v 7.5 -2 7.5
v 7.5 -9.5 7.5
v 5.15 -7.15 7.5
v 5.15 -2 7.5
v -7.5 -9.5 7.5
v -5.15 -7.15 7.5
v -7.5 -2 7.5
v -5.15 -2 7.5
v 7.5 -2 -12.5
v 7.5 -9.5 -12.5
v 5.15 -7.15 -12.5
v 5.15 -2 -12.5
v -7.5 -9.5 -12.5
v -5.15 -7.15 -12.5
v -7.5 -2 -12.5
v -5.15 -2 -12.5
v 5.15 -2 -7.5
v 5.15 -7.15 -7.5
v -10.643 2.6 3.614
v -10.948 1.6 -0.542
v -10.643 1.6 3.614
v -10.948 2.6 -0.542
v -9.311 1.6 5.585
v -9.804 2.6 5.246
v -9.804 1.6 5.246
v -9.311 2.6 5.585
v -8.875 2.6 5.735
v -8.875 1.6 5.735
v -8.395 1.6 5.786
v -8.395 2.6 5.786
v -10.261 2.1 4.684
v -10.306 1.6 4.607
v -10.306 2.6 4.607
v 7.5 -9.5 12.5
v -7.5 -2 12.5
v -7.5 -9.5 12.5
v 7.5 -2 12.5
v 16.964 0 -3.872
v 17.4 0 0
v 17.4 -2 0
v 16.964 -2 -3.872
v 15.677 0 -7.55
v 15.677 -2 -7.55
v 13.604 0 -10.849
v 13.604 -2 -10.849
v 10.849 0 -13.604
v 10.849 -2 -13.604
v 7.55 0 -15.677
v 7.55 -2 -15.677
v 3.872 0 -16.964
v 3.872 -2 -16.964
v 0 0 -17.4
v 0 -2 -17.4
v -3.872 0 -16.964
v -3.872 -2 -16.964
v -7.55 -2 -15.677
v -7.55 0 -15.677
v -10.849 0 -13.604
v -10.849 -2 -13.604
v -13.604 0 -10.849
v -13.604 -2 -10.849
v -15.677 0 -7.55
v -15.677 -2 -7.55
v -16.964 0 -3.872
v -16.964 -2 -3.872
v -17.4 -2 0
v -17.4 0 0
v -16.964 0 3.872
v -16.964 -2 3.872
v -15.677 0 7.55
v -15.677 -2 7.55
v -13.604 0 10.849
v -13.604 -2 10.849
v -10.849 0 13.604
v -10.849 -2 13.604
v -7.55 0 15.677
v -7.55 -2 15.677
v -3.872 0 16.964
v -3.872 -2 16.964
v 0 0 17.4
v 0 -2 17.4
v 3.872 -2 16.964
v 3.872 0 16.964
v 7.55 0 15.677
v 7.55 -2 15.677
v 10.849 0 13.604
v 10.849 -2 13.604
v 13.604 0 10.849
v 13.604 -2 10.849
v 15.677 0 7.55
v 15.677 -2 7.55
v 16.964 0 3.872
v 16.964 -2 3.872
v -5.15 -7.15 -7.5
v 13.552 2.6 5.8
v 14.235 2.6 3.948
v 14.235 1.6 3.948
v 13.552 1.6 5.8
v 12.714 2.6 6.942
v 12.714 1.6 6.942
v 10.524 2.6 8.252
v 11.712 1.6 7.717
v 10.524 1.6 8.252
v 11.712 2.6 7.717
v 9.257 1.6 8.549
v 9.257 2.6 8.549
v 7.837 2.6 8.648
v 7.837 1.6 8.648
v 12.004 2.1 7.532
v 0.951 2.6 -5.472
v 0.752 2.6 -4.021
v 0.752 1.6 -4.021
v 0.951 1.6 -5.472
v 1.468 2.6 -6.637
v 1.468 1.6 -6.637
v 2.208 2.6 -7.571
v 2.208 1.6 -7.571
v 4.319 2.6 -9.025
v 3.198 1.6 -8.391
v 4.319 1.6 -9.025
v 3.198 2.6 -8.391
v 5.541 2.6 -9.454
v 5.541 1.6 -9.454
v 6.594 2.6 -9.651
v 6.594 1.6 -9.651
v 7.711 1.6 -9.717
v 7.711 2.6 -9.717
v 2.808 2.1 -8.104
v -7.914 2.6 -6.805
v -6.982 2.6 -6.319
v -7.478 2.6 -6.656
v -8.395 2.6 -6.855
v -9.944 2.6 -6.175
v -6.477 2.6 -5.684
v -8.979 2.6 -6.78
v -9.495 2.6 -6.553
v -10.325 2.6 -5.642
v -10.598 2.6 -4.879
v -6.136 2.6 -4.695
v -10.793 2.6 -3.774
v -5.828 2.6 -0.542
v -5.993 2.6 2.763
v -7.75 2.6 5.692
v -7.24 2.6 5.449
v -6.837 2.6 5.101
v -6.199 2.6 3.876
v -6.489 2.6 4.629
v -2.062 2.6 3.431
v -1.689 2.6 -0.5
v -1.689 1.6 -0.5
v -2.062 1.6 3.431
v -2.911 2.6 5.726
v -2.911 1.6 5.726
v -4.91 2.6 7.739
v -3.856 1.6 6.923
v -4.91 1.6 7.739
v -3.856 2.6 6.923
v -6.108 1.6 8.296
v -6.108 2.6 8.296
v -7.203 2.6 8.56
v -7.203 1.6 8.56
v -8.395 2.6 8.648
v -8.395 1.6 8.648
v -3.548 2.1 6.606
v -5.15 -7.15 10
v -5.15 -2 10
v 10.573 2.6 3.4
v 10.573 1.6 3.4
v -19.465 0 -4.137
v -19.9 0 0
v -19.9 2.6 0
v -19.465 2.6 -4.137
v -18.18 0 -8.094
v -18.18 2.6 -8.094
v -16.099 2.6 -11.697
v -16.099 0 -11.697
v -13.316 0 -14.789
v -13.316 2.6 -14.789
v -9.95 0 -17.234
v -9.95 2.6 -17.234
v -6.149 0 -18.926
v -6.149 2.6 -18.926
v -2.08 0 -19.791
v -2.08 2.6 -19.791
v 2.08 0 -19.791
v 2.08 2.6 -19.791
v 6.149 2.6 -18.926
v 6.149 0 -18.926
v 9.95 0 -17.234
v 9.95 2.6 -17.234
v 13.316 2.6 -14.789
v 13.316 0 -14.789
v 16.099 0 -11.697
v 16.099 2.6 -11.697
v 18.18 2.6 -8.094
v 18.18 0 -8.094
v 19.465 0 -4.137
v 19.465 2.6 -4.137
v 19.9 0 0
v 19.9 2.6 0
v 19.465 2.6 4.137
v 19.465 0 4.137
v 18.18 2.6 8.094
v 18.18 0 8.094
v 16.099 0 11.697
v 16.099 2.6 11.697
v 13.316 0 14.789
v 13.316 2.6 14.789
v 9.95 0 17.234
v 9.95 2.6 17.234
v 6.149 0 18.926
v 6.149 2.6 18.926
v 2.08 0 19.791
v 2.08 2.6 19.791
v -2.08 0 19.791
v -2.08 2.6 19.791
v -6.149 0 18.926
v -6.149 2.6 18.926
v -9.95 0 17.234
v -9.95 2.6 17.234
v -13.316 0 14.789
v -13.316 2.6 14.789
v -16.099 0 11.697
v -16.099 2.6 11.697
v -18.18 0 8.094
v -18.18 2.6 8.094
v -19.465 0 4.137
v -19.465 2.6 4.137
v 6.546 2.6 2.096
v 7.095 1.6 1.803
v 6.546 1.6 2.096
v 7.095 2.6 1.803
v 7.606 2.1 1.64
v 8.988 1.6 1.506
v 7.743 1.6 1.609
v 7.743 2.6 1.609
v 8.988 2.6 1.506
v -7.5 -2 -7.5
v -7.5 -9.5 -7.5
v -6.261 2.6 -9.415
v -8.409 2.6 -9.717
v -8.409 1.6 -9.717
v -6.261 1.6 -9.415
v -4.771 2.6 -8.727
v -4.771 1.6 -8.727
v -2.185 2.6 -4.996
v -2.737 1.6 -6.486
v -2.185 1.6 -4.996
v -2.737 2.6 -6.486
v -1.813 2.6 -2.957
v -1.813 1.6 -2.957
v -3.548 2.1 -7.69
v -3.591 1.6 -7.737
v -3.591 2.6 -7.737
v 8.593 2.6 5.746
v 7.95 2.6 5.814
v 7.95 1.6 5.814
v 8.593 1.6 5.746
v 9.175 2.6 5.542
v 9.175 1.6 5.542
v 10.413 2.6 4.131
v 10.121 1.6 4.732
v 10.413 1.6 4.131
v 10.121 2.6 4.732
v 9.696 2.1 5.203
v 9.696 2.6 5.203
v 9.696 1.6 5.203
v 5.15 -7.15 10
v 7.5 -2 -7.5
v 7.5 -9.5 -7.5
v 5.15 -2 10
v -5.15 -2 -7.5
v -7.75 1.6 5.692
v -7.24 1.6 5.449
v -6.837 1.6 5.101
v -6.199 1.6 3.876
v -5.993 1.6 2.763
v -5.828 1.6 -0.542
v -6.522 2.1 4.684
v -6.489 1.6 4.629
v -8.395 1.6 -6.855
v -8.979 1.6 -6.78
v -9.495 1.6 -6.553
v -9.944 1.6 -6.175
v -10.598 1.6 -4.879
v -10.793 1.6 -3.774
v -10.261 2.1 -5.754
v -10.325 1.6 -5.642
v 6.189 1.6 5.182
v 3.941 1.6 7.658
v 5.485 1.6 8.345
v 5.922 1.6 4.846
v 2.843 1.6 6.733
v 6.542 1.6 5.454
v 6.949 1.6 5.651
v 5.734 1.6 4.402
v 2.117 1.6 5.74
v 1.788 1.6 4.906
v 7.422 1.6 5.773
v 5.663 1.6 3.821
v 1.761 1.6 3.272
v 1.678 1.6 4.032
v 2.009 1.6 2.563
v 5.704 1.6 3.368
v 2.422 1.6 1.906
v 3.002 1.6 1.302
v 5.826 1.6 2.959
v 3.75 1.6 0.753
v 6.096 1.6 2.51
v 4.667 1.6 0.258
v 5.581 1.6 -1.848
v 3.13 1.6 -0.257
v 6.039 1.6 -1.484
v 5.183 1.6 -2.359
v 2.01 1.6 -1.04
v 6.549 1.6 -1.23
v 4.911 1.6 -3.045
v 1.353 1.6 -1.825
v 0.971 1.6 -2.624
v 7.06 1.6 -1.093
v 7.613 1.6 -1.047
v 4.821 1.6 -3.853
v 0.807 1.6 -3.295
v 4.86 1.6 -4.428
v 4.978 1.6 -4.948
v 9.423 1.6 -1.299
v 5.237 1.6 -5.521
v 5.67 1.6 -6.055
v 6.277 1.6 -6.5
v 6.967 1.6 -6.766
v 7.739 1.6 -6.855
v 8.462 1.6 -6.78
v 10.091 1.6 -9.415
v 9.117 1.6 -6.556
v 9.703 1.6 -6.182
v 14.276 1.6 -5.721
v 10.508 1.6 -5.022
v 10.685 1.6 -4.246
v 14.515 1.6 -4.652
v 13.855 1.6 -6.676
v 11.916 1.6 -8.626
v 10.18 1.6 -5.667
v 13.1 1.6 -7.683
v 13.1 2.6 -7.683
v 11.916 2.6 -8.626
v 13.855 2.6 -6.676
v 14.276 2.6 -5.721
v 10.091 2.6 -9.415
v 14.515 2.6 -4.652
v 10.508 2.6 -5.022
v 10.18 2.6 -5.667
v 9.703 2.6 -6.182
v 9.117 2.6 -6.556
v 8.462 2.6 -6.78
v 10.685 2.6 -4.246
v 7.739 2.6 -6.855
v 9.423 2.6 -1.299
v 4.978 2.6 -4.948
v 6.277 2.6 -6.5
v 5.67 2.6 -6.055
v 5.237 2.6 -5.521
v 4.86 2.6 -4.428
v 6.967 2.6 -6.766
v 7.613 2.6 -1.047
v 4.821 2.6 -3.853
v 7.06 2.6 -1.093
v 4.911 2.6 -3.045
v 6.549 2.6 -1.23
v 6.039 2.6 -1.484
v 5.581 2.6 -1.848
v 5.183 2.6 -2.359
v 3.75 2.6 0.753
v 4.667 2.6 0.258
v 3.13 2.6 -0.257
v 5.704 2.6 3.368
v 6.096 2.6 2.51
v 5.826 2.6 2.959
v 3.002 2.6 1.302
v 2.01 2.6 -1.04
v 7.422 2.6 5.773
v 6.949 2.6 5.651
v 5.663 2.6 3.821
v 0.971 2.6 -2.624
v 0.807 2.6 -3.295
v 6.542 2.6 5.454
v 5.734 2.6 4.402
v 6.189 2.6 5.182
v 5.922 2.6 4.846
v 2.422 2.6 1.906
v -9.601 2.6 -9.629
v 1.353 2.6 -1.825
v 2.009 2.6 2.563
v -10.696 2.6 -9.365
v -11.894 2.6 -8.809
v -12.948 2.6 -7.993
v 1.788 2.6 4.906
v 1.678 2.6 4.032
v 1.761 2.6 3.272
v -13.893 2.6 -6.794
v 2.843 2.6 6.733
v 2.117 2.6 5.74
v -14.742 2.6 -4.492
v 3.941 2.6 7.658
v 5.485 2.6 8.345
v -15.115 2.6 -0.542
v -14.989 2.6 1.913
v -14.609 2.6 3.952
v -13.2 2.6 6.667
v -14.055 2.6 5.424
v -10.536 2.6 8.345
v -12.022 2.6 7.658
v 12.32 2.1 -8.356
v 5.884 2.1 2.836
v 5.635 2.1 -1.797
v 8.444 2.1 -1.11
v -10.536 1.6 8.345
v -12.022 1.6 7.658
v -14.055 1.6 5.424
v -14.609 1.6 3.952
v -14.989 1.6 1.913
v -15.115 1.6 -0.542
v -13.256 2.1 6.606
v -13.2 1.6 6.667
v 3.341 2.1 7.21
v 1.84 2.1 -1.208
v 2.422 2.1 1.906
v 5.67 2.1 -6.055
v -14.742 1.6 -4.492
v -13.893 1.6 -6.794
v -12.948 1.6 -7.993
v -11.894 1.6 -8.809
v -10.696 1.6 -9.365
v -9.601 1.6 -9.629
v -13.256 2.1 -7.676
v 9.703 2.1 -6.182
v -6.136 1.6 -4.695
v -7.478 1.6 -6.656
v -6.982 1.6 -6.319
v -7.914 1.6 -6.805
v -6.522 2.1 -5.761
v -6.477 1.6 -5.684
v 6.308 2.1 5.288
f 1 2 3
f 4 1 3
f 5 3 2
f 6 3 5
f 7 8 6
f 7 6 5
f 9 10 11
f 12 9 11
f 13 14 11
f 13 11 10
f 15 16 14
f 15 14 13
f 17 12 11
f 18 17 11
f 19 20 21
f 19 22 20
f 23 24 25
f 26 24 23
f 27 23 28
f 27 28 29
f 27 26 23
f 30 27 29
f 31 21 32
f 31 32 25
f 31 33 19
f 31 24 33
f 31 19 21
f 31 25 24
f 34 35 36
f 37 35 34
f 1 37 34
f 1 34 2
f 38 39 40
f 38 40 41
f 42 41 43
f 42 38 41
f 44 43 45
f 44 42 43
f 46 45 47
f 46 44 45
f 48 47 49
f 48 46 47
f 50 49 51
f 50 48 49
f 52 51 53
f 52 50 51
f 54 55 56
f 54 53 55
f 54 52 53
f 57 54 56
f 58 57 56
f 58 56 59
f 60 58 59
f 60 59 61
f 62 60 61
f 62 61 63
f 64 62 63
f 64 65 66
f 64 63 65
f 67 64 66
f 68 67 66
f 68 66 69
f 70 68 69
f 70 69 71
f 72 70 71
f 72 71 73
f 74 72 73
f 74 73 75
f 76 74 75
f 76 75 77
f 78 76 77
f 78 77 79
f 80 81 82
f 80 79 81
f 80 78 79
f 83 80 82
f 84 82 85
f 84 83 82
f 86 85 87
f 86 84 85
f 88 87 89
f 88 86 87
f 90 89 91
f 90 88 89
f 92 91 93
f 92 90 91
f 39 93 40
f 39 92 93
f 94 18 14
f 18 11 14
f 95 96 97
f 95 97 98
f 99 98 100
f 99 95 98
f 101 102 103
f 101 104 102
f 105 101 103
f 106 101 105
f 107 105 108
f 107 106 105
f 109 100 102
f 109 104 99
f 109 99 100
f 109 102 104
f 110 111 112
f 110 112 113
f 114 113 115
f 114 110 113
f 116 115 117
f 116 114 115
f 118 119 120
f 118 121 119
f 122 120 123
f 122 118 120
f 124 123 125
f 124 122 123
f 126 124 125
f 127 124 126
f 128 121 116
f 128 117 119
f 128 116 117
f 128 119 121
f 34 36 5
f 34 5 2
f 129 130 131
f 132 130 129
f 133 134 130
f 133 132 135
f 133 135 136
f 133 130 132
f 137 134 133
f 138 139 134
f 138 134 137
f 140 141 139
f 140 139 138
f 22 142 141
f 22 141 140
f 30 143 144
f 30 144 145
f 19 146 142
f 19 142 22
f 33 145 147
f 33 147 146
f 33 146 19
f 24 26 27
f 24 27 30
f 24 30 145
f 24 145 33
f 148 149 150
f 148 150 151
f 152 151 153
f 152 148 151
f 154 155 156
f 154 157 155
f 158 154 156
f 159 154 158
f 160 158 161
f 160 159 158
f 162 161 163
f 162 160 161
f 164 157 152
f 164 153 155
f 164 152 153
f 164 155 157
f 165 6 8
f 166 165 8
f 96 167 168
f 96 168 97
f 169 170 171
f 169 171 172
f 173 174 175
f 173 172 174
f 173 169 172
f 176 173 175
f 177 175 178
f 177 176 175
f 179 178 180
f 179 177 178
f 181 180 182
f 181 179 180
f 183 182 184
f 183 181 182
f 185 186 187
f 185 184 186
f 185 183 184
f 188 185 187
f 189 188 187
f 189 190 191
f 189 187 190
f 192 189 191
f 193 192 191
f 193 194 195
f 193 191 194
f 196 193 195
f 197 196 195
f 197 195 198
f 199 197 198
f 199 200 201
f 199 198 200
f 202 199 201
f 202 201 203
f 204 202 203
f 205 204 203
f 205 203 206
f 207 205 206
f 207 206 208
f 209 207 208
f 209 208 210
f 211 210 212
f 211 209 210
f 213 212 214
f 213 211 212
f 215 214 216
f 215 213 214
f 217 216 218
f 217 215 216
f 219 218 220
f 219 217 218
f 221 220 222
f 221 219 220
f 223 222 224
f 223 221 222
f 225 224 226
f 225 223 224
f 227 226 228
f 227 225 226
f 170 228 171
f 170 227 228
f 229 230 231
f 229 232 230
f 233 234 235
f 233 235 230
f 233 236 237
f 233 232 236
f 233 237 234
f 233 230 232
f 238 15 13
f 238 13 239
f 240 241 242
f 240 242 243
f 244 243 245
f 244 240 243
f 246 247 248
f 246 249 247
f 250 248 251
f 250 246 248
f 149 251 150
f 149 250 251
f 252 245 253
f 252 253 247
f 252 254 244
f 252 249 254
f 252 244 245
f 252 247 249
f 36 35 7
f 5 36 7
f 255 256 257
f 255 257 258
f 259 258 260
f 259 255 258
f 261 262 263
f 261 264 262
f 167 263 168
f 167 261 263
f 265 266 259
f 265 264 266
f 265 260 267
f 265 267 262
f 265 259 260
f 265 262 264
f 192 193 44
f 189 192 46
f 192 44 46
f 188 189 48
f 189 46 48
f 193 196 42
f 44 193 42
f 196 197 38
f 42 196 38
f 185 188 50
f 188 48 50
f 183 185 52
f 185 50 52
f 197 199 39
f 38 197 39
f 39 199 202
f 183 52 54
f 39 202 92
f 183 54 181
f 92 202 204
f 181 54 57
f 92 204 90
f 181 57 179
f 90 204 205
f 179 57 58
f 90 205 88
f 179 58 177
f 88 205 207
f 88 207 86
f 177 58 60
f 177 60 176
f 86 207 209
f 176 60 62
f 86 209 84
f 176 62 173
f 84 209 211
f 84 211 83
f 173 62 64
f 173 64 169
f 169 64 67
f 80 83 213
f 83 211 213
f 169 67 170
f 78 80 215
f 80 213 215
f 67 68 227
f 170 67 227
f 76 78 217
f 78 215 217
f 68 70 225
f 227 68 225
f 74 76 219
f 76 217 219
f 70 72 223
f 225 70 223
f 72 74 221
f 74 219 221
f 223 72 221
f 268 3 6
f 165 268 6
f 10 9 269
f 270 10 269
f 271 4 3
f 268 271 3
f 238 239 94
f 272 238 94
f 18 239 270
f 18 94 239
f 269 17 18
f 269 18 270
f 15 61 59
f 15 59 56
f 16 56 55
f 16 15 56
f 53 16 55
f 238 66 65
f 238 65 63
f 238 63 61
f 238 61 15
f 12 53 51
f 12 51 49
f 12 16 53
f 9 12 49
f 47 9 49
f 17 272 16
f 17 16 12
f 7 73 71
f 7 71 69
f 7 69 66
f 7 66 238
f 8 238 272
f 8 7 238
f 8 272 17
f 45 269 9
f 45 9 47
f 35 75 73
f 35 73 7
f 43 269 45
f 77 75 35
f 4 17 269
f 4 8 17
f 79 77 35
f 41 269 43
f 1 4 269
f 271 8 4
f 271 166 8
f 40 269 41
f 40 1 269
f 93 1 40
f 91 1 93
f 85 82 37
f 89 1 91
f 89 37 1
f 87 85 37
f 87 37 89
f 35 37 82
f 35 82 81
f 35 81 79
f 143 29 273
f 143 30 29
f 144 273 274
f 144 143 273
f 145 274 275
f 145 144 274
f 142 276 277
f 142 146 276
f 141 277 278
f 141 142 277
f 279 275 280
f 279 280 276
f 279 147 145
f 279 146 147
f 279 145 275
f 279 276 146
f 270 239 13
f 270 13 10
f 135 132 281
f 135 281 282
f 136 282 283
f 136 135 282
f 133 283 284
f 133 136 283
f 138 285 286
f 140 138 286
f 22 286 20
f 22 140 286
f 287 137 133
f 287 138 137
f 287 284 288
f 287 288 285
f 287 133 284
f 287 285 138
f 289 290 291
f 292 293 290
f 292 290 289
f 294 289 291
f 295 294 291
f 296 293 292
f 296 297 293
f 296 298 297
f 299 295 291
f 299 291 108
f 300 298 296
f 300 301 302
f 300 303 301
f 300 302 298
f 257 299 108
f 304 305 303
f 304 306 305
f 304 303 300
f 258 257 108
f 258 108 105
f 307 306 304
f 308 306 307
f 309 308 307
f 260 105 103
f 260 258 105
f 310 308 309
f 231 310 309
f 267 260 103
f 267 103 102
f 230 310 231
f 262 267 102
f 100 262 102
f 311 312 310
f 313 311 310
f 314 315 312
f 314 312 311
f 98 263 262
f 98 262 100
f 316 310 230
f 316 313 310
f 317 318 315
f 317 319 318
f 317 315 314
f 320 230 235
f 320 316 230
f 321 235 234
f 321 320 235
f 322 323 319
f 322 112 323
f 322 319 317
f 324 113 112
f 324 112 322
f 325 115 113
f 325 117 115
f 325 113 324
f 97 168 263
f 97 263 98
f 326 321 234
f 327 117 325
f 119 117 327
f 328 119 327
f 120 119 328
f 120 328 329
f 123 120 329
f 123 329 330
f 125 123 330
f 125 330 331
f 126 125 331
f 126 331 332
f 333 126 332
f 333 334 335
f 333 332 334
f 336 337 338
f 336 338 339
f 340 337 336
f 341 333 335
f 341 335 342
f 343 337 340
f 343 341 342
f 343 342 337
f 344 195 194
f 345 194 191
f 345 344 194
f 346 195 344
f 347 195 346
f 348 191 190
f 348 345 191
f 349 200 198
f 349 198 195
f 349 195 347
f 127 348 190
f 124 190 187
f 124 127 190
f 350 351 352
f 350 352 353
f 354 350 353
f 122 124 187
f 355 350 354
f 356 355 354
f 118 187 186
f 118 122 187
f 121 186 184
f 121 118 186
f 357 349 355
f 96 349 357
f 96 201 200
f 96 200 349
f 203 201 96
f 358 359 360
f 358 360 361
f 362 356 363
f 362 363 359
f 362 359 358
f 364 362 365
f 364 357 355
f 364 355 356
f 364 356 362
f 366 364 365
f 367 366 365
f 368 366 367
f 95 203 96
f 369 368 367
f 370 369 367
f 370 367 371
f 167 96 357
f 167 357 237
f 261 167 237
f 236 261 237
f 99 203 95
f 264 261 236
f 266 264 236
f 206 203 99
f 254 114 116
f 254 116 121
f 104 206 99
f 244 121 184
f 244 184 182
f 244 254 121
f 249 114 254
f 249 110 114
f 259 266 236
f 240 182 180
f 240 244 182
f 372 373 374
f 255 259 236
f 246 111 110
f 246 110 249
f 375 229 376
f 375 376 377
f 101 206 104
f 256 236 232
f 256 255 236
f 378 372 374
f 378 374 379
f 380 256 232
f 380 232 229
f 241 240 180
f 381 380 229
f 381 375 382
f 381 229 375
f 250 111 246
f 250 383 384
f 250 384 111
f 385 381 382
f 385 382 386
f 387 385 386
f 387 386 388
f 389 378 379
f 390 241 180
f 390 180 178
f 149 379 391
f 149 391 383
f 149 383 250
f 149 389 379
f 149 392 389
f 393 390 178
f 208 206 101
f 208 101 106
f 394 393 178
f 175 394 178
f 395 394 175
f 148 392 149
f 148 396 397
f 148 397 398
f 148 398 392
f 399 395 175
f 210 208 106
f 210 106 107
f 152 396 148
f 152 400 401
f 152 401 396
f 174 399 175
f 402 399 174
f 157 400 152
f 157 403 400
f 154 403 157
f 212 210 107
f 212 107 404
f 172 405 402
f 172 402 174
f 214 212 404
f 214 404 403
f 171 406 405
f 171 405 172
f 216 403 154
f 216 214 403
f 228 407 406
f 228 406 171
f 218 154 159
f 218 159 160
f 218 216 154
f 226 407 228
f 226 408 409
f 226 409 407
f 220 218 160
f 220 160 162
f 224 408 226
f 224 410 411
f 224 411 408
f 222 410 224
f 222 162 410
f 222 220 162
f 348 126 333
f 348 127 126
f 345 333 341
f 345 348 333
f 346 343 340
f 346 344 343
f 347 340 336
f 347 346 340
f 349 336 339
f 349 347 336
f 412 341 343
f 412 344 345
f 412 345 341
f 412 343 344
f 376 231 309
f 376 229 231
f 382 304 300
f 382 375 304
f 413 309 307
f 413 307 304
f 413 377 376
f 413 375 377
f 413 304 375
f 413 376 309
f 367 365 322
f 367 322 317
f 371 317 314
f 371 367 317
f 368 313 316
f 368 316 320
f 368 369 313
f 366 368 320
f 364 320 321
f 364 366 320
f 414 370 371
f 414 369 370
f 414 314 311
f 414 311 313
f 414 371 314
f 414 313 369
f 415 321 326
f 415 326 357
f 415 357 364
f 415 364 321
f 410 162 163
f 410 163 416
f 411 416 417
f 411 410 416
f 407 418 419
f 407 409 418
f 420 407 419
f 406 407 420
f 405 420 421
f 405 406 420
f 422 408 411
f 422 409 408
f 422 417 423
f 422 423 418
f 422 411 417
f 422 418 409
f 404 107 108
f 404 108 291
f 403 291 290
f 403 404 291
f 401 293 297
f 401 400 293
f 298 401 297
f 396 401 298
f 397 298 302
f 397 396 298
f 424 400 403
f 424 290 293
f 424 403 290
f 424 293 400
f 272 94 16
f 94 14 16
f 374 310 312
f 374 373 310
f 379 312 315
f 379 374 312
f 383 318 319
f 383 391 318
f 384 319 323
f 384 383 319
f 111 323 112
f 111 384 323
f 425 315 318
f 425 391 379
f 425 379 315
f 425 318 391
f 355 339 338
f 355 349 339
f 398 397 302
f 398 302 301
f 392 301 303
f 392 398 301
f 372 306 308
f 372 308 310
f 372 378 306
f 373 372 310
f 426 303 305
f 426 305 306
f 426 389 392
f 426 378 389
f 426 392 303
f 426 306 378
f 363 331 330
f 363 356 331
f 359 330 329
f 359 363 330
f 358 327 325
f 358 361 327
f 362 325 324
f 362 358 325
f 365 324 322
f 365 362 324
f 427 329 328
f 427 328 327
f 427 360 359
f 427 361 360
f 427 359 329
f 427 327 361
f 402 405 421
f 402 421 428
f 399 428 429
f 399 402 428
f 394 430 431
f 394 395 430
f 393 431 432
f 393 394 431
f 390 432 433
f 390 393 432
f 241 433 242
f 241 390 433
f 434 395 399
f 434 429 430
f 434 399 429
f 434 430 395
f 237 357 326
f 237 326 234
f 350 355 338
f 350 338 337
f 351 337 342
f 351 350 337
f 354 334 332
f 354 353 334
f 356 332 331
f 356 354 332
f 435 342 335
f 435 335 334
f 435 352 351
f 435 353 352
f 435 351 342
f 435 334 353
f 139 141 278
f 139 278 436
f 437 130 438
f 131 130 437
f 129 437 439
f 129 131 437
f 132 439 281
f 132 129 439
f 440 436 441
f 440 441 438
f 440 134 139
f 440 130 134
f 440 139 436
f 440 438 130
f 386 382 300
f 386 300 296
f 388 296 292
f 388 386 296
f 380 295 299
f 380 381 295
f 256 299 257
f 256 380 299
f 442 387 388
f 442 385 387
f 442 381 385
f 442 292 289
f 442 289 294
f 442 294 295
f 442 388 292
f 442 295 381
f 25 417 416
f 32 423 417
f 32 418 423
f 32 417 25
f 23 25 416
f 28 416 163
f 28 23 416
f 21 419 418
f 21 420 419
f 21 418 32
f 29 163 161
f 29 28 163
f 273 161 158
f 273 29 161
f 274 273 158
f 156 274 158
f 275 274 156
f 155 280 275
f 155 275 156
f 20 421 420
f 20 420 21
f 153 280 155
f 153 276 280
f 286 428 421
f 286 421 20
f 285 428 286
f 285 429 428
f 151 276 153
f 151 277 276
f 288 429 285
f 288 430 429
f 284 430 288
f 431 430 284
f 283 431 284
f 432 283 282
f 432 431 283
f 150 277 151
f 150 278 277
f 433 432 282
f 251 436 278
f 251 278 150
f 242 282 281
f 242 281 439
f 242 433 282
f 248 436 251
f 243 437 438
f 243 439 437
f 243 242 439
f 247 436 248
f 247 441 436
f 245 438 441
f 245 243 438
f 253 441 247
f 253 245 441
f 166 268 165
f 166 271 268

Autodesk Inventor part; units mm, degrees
ref_plane "YZ Plane" through (0, 0, 0) normal (1, 0, 0) x (0, 1, 0)
ref_plane "XZ Plane" through (0, 0, 0) normal (0, 1, 0) x (-1, 0, 0)
sketch "Sketch1" plane through (0, 0, 0) normal (0, 1, 0) x (-1, 0, 0)
  circle A0 centre (0, 0) radius 19.9
  dimension "d0" = 39.8
extrude "Extrusion1" add sketch "Sketch1" along normal blind 2.6
sketch "Sketch2" plane through (0, 0, 0) normal (0, -1, 0) x (1, 0, 0)
  circle A0 centre (0, 0) radius 19.9 projected
  circle A1 centre (0, 0) radius 17.4
  dimension "d3" = 34.8
extrude "Extrusion2" add sketch "Sketch2" along normal blind 2 contours A1
sketch "Sketch3" plane through (0, -2, 0) normal (0, -1, 0) x (1, 0, 0)
  circle A0 centre (0, 0) radius 17.4 projected
  line L0 (0, 0) -> (0, 17.4) construction
  line L1 (0, 0) -> (17.4, 0) construction
  line L2 (0, 12.5) -> (7.5, 12.5)
  line L3 (7.5, 12.5) -> (7.5, 7.5)
  line L4 (7.5, 7.5) -> (0, 7.5)
  line L5 (0, 12.5) -> (-7.5, 12.5)
  line L6 (-7.5, 12.5) -> (-7.5, 7.5)
  line L7 (-7.5, 7.5) -> (0, 7.5)
  line L8 (0, -12.5) -> (7.5, -12.5)
  line L9 (7.5, -12.5) -> (7.5, -7.5)
  line L10 (7.5, -7.5) -> (0, -7.5)
  line L11 (-7.5, -7.5) -> (0, -7.5)
  line L12 (-7.5, -12.5) -> (-7.5, -7.5)
  line L13 (0, -12.5) -> (-7.5, -12.5)
  dimension "d6" = 15
  dimension "d7" = 5
  dimension "d8" = 15
extrude "Extrusion3" add sketch "Sketch3" along normal blind 7.5 contours L2 L3 L4 L7 L6 L5 | L13 L12 L11 L10 L9 L8
ref_plane "Work Plane1" through (7.5, -9.5, 10) normal (0, 0, 1) x (1, 0, 0)
sketch "Sketch4" plane through (7.5, -2, -12.5) normal (0, 0, -1) x (-1, 0, 0)
  line L0 (0, 0) -> (15, 0) projected
  line L1 (0, 0) -> (0, -7.5) projected
  line L2 (15, -7.5) -> (0, -7.5) projected
  line L3 (15, 0) -> (15, -7.5) projected
  line L4 (2.35, 0) -> (2.35, -5.15)
  line L5 (2.35, -5.15) -> (12.65, -5.15)
  line L6 (12.65, -5.15) -> (12.65, 0)
  line L7 (2.35, -5.15) -> (0, -5.15) construction
  line L8 (2.35, -5.15) -> (2.35, -7.5) construction
  line L9 (12.65, -5.15) -> (15, -5.15) construction
  point P0 (7.5, 2)
  dimension "d11" = 10.3
extrude "Extrusion4" cut sketch "Sketch4" against normal up to surface (22.5 mm away) contours L0 L6 L5 L4
sketch "Sketch5" plane through (0, 2.6, 0) normal (0, 1, 0) x (1, 0, 0)
  line L0 (15.5957, -8.6476) -> (-15.5957, -8.6476) construction
  line L1 (-15.5957, -8.6476) -> (-15.5957, 11.0665) construction
  line L2 (-15.5957, 11.0665) -> (15.5957, 11.0665) construction
  line L3 (15.5957, 11.0665) -> (15.5957, -8.6476) construction
  line L4 (14.5154, 4.6525) -> (10.6853, 4.2456)
  spline S0 degree 2 poles (10.6853, 4.2456) (10.531, 5.5083) (8.8755, 6.8551) (7.7391, 6.8551) knots 0 0 0 1 2 2 2
  spline S1 degree 2 poles (7.7391, 6.8551) (6.5185, 6.8551) (4.8209, 5.2558) (4.8209, 3.8528) knots 0 0 0 1 2 2 2
  spline S2 degree 2 poles (4.8209, 3.8528) (4.8209, 2.548) (6.4483, 1.0469) (7.6128, 1.0469) knots 0 0 0 1 2 2 2
  spline S3 degree 2 poles (7.6128, 1.0469) (8.3704, 1.0469) (9.4226, 1.2994) knots 0 0 0 1 1 1
  line L5 (9.4226, 1.2994) -> (8.9877, -1.5065)
  spline S4 degree 2 poles (8.9877, -1.5065) (7.4444, -1.4785) (6.5465, -2.0958) knots 0 0 0 1 1 1
  spline S5 degree 2 poles (6.5465, -2.0958) (5.6627, -2.7131) (5.6627, -3.8214) knots 0 0 0 1 1 1
  spline S6 degree 2 poles (5.6627, -3.8214) (5.6627, -4.7614) (6.9534, -5.8136) (7.9495, -5.8136) knots 0 0 0 1 2 2 2
  spline S7 degree 2 poles (7.9495, -5.8136) (8.9596, -5.8136) (10.4328, -4.593) (10.573, -3.4005) knots 0 0 0 1 2 2 2
  line L6 (10.573, -3.4005) -> (14.2348, -3.9477)
  spline S8 degree 2 poles (14.2348, -3.9477) (13.6596, -6.4169) (10.3486, -8.6476) (7.8373, -8.6476) knots 0 0 0 1 2 2 2
  spline S9 degree 2 poles (7.8373, -8.6476) (5.0033, -8.6476) (1.6783, -5.7715) (1.6783, -4.0318) knots 0 0 0 1 2 2 2
  spline S10 degree 2 poles (1.6783, -4.0318) (1.6783, -2.8534) (3.1654, -0.9594) (4.6666, -0.2579) knots 0 0 0 1 2 2 2
  spline S11 degree 2 poles (4.6666, -0.2579) (2.9269, 0.0788) (0.7523, 2.3376) (0.7523, 4.0212) knots 0 0 0 1 2 2 2
  spline S12 degree 2 poles (0.7523, 4.0212) (0.7523, 6.4904) (4.863, 9.7172) (7.711, 9.7172) knots 0 0 0 1 2 2 2
  spline S13 degree 2 poles (7.711, 9.7172) (10.4328, 9.7172) (14.2067, 6.9954) (14.5154, 4.6525) knots 0 0 0 1 2 2 2
  spline S14 degree 2 poles (-8.395, -8.6476) (-11.3973, -8.6476) (-15.1152, -4.565) (-15.1152, 0.5418) knots 0 0 0 1 2 2 2
  spline S15 degree 2 poles (-15.1152, 0.5418) (-15.1152, 5.6346) (-11.3973, 9.7172) (-8.409, 9.7172) knots 0 0 0 1 2 2 2
  spline S16 degree 2 poles (-8.409, 9.7172) (-5.4067, 9.7172) (-1.6888, 5.6626) (-1.6888, 0.4997) knots 0 0 0 1 2 2 2
  spline S17 degree 2 poles (-1.6888, 0.4997) (-1.6888, -4.565) (-5.4067, -8.6476) (-8.395, -8.6476) knots 0 0 0 1 2 2 2
  spline S18 degree 2 poles (-8.395, -5.7855) (-7.2165, -5.7855) (-5.8276, -3.5829) (-5.8276, 0.5418) knots 0 0 0 1 2 2 2
  spline S19 degree 2 poles (-5.8276, 0.5418) (-5.8276, 4.6665) (-7.2165, 6.8551) (-8.395, 6.8551) knots 0 0 0 1 2 2 2
  spline S20 degree 2 poles (-8.395, 6.8551) (-9.5735, 6.8551) (-10.9484, 4.6525) (-10.9484, 0.5418) knots 0 0 0 1 2 2 2
  spline S21 degree 2 poles (-10.9484, 0.5418) (-10.9484, -3.5829) (-9.5735, -5.7855) (-8.395, -5.7855) knots 0 0 0 1 2 2 2
extrude "Extrusion5" cut sketch "Sketch5" against normal blind 1
properties part number "Inside"
